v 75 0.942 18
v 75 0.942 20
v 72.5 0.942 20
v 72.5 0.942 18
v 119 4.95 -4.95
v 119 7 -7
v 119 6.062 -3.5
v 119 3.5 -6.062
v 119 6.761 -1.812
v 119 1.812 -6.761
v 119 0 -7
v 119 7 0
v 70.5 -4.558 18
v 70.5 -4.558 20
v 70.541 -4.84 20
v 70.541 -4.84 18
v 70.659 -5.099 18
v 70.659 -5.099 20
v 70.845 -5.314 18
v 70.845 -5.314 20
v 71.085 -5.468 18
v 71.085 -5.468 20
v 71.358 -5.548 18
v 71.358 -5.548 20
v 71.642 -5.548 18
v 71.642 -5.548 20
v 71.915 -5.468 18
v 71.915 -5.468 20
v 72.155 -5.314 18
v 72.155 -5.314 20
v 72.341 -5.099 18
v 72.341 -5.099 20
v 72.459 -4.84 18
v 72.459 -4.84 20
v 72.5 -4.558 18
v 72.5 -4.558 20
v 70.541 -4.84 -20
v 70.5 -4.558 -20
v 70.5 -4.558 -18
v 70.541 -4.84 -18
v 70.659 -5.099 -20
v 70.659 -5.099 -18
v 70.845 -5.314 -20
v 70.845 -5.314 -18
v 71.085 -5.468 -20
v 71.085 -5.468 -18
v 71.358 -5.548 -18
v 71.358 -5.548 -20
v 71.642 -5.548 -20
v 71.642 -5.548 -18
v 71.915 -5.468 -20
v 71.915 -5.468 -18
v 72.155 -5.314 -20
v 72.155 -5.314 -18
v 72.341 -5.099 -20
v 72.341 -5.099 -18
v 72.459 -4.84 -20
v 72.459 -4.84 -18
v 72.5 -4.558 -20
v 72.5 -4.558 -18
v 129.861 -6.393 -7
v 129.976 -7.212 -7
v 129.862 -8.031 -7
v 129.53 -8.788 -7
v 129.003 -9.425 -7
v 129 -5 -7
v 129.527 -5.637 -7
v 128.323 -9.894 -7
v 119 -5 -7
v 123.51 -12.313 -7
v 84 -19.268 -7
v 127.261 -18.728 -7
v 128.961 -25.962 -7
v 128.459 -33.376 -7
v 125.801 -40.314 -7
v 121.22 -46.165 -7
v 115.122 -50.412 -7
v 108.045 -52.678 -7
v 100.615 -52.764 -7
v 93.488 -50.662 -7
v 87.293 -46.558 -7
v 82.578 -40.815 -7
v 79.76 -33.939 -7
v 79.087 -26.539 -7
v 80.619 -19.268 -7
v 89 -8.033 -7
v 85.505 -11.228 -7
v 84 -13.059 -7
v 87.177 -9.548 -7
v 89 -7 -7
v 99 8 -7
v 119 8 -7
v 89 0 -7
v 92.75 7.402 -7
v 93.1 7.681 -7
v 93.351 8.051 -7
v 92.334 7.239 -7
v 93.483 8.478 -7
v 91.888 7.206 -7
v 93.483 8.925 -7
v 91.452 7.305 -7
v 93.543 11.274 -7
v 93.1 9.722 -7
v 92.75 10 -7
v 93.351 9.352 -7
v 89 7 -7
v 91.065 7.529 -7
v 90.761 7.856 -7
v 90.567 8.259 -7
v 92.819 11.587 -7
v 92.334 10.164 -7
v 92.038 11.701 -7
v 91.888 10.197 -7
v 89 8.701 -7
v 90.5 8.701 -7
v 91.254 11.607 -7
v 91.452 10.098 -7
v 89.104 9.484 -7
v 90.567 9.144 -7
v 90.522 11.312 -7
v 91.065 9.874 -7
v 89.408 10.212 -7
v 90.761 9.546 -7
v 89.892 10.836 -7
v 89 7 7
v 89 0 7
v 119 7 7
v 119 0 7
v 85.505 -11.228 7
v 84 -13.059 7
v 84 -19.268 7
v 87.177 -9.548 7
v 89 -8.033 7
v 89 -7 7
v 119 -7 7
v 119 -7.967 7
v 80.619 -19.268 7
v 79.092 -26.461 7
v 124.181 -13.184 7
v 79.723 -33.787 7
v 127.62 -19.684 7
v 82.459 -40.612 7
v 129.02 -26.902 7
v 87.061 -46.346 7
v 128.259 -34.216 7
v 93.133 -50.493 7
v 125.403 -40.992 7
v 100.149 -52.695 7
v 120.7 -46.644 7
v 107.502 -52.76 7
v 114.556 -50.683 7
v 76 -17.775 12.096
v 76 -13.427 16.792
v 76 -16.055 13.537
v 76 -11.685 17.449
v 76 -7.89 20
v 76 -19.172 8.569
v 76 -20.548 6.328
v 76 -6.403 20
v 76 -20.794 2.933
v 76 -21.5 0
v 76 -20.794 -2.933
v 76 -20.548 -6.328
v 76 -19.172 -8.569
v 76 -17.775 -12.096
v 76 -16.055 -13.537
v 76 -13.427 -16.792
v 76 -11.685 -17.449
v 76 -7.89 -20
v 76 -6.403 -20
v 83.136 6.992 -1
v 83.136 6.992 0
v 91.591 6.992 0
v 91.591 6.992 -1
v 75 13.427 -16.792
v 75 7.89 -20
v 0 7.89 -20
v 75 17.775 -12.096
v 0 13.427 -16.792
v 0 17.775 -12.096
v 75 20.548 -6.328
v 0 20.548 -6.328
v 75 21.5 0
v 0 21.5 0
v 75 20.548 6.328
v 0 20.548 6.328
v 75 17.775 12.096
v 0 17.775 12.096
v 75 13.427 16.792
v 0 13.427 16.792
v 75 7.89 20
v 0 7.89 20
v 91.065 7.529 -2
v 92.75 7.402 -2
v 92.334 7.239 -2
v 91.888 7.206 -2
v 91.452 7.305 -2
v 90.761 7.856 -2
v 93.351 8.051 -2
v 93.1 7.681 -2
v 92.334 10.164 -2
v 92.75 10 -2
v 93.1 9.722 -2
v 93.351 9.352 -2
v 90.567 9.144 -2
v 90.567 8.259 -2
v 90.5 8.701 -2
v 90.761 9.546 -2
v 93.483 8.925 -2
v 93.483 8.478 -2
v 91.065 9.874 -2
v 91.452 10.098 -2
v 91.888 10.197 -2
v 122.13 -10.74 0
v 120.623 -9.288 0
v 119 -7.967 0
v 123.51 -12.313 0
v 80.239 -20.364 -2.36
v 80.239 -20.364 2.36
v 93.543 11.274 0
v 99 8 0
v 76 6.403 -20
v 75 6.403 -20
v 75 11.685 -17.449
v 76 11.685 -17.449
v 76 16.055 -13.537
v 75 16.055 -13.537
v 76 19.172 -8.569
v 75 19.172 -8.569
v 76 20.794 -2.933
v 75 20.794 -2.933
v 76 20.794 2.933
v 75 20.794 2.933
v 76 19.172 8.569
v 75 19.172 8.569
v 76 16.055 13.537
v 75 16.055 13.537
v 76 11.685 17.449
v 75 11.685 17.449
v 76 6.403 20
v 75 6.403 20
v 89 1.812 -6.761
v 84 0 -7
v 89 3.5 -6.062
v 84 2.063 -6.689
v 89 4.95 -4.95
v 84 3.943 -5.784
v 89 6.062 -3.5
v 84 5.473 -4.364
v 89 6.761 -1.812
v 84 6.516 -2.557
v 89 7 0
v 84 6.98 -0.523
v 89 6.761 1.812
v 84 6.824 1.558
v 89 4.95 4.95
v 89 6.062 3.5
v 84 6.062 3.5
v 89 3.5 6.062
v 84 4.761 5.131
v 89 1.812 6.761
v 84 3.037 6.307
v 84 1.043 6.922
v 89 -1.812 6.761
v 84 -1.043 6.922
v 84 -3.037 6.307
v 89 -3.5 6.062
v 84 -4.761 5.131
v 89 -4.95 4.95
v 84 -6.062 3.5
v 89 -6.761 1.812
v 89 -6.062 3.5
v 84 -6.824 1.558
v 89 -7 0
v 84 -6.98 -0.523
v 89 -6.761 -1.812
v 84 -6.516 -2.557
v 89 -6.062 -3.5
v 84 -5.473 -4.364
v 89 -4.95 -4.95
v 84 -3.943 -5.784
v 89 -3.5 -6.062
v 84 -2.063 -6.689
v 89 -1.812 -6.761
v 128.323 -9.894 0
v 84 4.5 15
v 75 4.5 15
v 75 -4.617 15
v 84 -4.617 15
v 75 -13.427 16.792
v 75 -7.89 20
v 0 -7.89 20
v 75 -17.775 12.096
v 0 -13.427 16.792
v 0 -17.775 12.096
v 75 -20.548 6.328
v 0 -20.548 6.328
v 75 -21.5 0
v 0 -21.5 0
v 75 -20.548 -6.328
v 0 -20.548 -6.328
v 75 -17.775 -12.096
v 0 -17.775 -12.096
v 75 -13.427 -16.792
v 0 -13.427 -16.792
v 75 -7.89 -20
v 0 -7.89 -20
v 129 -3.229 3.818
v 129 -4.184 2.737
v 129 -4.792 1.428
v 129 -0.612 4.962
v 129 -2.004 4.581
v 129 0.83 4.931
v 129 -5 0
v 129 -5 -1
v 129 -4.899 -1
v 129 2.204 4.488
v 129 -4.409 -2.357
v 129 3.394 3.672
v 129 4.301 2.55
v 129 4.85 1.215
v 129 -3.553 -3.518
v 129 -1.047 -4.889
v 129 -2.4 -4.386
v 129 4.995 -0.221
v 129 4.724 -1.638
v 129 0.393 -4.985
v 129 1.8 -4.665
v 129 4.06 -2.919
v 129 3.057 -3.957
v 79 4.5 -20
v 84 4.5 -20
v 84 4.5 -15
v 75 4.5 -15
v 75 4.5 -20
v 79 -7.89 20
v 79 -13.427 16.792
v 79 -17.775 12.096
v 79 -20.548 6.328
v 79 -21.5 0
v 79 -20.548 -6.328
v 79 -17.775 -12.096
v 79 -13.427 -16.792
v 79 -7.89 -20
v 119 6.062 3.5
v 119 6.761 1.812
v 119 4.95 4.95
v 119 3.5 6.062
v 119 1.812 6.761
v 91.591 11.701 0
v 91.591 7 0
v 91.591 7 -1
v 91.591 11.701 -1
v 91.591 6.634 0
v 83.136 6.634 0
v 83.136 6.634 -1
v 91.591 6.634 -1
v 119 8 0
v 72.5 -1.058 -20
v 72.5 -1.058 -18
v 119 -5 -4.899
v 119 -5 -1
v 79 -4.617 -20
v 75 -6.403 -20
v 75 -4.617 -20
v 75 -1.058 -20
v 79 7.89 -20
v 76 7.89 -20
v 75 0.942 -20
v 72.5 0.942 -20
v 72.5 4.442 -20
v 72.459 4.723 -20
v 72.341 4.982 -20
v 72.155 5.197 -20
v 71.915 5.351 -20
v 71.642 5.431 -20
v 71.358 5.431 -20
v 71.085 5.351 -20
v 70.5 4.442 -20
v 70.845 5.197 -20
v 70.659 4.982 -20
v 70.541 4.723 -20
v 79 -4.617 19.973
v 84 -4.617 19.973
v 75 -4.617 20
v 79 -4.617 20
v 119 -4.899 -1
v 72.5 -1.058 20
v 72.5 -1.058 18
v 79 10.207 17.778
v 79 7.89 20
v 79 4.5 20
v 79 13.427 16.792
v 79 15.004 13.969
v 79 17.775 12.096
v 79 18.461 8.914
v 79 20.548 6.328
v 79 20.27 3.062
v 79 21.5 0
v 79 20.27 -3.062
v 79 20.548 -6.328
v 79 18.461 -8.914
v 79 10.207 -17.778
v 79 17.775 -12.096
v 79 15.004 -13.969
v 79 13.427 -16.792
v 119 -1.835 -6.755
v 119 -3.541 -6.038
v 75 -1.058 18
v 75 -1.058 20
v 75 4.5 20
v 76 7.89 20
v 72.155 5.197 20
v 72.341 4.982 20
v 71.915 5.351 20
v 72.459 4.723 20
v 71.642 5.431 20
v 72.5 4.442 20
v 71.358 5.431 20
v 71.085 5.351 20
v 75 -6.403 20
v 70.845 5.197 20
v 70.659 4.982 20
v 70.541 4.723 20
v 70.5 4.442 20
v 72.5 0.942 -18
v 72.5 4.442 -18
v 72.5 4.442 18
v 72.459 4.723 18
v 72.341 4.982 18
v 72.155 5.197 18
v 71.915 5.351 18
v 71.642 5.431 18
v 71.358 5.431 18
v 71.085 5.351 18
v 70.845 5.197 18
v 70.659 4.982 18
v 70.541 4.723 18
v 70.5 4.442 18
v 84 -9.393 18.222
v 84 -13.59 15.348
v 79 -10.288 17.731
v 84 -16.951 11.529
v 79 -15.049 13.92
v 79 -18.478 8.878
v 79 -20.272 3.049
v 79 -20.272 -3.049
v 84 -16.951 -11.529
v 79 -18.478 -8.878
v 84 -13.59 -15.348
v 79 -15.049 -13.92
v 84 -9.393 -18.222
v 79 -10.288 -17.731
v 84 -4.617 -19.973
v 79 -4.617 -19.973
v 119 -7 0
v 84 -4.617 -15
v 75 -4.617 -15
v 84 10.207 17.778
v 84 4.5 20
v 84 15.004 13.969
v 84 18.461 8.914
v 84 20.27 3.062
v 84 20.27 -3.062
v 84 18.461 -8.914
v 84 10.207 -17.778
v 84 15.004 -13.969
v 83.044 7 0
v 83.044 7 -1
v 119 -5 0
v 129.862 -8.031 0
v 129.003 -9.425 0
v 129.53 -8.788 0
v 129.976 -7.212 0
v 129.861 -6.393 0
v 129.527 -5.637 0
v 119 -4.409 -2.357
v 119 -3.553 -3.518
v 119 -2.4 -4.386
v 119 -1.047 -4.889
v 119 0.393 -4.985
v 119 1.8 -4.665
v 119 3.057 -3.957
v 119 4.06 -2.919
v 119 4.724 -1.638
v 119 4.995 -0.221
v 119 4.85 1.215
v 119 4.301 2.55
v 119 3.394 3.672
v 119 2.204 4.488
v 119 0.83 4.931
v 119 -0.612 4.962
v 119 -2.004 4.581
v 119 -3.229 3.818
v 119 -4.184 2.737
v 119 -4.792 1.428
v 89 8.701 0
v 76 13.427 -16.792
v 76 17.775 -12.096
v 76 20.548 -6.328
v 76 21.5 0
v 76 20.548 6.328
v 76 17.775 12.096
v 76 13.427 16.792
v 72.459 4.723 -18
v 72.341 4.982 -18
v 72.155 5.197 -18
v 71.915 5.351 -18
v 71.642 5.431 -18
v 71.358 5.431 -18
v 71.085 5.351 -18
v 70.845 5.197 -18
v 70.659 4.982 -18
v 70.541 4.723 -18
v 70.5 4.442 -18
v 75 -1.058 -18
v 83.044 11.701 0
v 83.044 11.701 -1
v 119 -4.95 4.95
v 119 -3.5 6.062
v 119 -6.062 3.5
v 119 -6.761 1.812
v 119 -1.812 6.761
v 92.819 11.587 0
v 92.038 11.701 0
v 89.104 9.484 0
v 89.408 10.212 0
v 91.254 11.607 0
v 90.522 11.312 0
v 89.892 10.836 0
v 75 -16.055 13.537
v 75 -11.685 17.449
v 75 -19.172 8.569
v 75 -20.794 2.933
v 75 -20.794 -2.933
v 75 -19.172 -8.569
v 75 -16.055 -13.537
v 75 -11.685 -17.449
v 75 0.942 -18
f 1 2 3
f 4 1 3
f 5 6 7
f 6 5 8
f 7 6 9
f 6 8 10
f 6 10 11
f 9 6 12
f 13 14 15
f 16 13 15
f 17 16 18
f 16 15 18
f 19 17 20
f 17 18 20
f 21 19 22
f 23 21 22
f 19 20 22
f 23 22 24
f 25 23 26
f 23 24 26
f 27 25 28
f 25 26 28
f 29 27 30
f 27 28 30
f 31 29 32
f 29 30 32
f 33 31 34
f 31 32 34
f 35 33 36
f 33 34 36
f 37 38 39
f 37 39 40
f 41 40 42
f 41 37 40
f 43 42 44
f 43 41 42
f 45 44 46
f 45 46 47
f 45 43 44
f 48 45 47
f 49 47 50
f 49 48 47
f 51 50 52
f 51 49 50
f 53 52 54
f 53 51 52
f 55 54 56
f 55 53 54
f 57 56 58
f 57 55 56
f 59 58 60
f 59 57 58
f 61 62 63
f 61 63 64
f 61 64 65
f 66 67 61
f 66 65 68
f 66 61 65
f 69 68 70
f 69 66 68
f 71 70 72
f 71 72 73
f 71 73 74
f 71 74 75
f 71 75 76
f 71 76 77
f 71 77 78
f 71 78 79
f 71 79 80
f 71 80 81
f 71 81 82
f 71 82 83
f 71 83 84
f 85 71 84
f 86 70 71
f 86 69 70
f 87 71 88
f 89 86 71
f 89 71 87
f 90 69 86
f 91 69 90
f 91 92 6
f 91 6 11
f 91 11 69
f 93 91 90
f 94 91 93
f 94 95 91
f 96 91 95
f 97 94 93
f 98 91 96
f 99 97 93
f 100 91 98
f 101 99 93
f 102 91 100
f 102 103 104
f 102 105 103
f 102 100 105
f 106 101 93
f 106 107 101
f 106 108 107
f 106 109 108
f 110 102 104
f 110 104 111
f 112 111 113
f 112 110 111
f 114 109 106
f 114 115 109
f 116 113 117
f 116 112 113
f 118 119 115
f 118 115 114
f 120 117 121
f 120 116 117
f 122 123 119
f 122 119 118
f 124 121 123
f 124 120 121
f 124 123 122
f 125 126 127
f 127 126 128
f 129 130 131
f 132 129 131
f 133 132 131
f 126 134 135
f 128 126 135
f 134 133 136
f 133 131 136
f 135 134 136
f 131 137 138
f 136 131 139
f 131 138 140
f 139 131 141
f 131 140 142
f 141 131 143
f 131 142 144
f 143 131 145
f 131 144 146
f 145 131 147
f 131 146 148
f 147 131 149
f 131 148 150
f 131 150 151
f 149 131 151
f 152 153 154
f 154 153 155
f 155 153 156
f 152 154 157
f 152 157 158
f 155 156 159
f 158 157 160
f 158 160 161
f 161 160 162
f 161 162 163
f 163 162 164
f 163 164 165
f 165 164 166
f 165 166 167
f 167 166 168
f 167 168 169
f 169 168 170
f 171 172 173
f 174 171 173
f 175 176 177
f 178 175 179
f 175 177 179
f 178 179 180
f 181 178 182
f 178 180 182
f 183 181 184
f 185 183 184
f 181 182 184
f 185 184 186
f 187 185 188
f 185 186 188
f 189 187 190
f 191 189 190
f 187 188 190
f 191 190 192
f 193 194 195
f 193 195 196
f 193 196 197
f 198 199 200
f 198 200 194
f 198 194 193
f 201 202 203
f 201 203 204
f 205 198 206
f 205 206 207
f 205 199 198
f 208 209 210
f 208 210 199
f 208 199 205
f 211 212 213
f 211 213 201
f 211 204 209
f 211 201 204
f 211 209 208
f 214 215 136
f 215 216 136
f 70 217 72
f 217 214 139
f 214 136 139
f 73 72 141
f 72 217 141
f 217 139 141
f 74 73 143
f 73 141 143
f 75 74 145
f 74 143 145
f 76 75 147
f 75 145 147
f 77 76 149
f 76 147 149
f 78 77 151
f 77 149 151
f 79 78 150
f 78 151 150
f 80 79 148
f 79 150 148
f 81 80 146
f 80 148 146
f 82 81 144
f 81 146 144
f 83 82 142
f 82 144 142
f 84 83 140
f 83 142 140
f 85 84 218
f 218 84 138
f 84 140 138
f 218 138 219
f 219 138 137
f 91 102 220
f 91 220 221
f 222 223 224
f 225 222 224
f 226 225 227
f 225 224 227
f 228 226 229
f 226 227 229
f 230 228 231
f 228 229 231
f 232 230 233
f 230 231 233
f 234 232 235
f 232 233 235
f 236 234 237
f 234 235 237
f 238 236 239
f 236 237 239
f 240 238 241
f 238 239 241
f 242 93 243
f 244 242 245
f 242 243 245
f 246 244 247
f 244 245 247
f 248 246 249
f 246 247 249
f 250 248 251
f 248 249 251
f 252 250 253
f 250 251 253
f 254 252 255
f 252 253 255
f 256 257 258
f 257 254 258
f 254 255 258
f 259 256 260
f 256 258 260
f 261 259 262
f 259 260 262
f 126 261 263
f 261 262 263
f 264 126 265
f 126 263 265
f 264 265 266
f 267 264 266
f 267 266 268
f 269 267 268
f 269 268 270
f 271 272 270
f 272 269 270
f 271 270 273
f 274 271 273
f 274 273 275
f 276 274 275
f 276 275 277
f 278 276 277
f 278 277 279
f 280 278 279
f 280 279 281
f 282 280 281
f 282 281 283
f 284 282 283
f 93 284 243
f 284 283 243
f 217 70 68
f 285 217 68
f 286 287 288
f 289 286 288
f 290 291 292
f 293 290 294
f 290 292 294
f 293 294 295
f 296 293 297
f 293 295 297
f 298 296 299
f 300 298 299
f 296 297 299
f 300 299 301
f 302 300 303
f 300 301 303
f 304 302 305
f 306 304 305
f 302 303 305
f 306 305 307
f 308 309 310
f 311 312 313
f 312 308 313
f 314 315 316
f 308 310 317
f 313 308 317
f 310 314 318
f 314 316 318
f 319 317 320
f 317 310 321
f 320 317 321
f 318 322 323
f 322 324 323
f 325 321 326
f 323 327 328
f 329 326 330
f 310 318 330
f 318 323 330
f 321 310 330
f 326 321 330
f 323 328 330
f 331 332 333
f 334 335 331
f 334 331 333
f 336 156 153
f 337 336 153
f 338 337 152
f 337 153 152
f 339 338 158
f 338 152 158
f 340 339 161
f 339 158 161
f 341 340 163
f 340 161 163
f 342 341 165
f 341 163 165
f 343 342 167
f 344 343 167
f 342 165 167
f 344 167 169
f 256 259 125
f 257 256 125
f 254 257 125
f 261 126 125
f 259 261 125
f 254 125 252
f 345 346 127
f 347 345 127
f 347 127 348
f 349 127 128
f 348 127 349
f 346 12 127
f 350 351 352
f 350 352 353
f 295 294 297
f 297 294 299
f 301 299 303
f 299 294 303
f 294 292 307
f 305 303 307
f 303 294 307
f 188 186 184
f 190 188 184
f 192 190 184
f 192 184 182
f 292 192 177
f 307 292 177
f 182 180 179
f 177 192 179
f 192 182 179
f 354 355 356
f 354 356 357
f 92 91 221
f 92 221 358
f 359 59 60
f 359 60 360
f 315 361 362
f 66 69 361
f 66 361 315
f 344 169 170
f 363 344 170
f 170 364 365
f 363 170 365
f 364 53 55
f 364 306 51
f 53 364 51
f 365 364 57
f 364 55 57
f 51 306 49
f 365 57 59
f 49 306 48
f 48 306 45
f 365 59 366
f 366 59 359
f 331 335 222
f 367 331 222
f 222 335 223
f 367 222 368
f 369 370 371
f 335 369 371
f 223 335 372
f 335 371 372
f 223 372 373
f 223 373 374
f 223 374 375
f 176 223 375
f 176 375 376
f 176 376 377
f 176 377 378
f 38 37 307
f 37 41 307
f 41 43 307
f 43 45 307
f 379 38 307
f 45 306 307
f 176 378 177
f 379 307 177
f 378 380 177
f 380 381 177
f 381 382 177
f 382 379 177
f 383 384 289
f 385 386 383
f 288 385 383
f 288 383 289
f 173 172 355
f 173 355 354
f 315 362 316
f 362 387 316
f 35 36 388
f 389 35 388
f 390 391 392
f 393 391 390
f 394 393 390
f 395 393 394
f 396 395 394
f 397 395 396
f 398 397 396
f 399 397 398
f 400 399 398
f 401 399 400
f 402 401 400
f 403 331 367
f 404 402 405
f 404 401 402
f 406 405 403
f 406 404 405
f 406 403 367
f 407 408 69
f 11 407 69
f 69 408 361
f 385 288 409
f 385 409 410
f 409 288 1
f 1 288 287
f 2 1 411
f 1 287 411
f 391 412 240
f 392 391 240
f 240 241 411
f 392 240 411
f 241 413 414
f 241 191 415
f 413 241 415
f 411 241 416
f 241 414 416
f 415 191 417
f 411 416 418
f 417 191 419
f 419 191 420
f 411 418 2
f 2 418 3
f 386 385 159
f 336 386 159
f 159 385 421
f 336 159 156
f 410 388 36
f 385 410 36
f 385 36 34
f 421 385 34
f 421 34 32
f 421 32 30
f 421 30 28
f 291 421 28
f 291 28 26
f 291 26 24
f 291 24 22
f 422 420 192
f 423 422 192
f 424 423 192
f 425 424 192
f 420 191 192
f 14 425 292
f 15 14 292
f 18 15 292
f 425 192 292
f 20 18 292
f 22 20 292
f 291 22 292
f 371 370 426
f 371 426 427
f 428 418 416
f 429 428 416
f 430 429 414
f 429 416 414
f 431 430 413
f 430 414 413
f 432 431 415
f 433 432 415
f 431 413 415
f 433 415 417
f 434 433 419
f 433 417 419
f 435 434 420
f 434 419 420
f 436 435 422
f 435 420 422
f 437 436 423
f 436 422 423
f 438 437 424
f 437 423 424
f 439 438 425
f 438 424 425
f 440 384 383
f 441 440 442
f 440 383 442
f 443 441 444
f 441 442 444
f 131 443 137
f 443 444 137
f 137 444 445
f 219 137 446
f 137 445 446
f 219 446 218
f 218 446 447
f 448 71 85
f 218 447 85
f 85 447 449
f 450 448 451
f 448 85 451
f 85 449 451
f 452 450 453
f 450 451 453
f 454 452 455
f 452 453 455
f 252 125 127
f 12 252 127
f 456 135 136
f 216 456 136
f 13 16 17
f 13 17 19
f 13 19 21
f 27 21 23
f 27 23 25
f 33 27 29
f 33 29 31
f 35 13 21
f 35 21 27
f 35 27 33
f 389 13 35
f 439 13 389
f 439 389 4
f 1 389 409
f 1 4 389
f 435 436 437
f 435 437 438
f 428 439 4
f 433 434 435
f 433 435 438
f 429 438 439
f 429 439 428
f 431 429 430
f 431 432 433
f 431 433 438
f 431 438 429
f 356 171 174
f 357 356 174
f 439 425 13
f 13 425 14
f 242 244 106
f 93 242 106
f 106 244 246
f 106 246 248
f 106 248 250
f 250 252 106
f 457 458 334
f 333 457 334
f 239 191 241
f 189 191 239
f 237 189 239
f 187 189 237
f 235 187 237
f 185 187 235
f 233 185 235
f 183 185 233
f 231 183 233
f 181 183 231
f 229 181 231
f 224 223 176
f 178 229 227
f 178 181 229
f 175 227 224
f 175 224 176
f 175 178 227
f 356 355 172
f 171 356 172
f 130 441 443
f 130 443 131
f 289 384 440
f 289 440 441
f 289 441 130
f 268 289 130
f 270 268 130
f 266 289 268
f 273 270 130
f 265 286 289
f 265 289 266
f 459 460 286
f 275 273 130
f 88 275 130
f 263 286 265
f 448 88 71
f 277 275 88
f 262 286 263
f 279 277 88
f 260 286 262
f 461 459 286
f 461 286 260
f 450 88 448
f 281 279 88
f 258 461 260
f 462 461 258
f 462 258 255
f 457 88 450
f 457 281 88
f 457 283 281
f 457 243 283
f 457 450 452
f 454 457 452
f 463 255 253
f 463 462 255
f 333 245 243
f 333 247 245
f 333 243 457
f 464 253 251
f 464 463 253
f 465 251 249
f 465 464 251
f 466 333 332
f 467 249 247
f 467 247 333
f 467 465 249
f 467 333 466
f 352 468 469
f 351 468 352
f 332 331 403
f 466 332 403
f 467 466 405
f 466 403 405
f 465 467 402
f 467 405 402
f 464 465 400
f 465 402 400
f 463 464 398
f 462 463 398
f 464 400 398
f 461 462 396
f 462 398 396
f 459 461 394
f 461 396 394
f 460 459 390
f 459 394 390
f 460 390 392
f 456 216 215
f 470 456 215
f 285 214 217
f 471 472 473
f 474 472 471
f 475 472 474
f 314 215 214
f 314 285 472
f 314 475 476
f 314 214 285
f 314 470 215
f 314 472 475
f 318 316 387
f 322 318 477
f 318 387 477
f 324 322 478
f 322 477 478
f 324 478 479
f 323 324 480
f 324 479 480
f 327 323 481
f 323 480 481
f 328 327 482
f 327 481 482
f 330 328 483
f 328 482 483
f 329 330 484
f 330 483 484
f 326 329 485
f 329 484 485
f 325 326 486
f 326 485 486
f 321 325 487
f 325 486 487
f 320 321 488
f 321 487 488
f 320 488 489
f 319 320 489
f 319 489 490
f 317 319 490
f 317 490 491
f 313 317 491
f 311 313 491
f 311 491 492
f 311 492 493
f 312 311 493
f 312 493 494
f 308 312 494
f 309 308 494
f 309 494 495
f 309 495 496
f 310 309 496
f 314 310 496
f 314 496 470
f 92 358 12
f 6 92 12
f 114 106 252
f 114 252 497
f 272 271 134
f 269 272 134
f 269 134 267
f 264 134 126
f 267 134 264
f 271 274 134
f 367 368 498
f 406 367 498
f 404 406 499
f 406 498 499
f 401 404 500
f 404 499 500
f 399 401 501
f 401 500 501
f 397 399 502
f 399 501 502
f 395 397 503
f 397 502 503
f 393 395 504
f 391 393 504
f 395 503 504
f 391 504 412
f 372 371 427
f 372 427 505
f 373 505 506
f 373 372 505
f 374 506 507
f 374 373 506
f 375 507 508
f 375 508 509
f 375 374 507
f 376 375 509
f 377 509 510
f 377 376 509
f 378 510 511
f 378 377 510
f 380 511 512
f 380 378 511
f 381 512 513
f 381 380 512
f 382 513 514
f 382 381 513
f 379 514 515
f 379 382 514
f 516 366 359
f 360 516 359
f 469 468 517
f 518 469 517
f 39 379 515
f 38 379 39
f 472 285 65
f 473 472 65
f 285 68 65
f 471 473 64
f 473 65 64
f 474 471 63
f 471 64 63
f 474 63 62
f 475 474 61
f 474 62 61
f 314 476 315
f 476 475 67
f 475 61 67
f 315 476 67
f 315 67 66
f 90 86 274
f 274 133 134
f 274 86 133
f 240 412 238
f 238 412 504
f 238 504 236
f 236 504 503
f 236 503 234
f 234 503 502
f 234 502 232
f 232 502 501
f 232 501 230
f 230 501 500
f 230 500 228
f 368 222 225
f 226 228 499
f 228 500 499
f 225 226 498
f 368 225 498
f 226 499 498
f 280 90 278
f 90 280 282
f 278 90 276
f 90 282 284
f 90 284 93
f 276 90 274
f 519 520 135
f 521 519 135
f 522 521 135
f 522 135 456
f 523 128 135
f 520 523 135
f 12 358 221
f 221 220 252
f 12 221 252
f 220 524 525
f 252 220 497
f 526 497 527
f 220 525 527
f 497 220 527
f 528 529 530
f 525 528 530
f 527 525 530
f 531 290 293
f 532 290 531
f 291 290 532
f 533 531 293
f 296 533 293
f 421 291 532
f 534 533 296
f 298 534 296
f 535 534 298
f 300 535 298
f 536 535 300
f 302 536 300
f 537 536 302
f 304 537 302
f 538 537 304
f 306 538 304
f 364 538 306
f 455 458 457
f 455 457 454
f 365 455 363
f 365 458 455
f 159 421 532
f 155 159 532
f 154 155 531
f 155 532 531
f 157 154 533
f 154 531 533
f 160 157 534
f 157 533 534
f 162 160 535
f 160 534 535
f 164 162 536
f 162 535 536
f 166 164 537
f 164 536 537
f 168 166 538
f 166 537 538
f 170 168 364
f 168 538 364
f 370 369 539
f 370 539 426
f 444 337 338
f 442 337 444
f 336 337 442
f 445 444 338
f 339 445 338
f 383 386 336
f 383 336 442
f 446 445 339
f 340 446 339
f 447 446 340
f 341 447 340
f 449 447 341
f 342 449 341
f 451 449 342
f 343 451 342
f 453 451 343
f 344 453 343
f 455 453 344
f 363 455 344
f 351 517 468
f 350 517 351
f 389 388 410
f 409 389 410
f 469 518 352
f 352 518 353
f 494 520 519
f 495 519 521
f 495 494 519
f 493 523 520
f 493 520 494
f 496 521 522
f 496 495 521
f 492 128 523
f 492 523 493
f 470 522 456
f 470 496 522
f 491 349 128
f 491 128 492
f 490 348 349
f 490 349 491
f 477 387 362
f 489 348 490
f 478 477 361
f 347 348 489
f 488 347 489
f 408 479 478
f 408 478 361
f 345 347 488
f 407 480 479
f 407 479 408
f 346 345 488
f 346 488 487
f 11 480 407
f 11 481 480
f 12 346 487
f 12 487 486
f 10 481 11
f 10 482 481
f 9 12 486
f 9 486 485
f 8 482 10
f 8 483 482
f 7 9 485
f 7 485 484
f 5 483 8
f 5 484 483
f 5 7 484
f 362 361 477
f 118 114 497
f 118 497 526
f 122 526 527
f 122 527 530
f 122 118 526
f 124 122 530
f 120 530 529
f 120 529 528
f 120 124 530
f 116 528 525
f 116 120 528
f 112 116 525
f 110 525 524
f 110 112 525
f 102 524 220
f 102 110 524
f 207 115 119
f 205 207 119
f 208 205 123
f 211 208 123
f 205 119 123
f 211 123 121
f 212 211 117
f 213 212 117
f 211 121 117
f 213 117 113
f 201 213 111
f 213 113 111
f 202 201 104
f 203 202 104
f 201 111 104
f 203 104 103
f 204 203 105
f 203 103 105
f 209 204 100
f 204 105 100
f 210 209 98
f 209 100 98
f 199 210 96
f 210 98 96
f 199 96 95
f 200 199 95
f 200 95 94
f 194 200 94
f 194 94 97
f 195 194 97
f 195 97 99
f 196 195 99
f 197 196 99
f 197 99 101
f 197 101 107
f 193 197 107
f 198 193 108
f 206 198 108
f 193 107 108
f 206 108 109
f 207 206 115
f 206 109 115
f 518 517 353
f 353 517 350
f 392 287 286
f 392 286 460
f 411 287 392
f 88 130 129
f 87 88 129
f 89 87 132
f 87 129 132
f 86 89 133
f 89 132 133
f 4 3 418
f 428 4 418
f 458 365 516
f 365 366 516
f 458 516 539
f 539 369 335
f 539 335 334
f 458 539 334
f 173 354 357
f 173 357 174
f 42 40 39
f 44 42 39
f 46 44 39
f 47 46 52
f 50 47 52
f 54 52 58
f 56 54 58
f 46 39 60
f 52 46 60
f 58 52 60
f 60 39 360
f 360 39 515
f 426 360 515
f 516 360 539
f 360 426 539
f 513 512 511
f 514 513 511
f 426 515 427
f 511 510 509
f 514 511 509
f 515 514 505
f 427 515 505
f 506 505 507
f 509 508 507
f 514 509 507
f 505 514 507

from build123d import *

# Parameters (mm, degrees)
BOSS_EXTRU_1_DEPTH      = 75
BOSS_EXTRU_2_DEPTH      = 1
BOSS_EXTRU_3_DEPTH      = 3
BOSS_EXTRU_4_DEPTH      = 5
ENL_V_START             = -9
ENL_V_MAT_EXTRU_4_DEPTH = 9
ESQUISSE6_W             = 1.343848997
ESQUISSE6_H             = 2
ENL_V_MAT_EXTRU_5_DEPTH = 2
ESQUISSE7_W             = 4.610249179
ESQUISSE7_H             = 2
ENL_V_MAT_EXTRU_7_DEPTH = 2
ESQUISSE8_R             = 7
BOSS_EXTRU_5_DEPTH      = 35
ESQUISSE9_R             = 5
BOSS_EXTRU_6_DEPTH      = 10
BOSS_EXTRU_7_DEPTH      = 14
BOSS_EXTRU_8_DEPTH      = 7
ESQUISSE11_W            = 8.454779373
ESQUISSE11_H            = 0.357592341
BOSS_EXTRU_14_DEPTH     = 1
ESQUISSE11_W_2          = 8.547038988
ESQUISSE11_H_2          = 4.701428863
BOSS_EXTRU_14_2_DEPTH   = 1
ESQUISSE13_R            = 1.5
ENL_V_MAT_EXTRU_9_DEPTH = 5
BOSS_EXTRU_19_DEPTH     = 6
BOSS_EXTRU_21_DEPTH     = 1


with BuildPart() as part:
    # Esquisse1 → Boss.-Extru.1 (new body)
    with BuildSketch(Plane(origin=(0, 0, 0), x_dir=(0, 0, -1), z_dir=(1, 0, 0))):
        with BuildLine():
            Line((-20, 7.889866919), (-20, -7.889866919))
            ThreePointArc((-20, -7.889866919), (0, -21.5), (20, -7.889866919))
            Line((20, -7.889866919), (20, 7.889866919))
            ThreePointArc((20, 7.889866919), (0, 21.5), (-20, 7.889866919))
        make_face()
    extrude(amount=BOSS_EXTRU_1_DEPTH)

    # Esquisse2 → Boss.-Extru.2 (add)
    with BuildSketch(Plane(origin=(75, 0, 0), x_dir=(0, 0, -1), z_dir=(1, 0, 0))):
        with BuildLine():
            Line((-20, 6.403124237), (-20, -6.403124237))
            ThreePointArc((-20, -6.403124237), (0, -21), (20, -6.403124237))
            Line((20, -6.403124237), (20, 6.403124237))
            ThreePointArc((20, 6.403124237), (0, 21), (-20, 6.403124237))
        make_face()
    extrude(amount=BOSS_EXTRU_2_DEPTH)

    # Esquisse3 → Boss.-Extru.3 (add)
    with BuildSketch(Plane(origin=(76, 0, 0), x_dir=(0, 0, -1), z_dir=(1, 0, 0))):
        with BuildLine():
            Line((-20, 7.889866919), (-20, -7.889866919))
            ThreePointArc((-20, -7.889866919), (0, -21.5), (20, -7.889866919))
            Line((20, -7.889866919), (20, 7.889866919))
            ThreePointArc((20, 7.889866919), (0, 21.5), (-20, 7.889866919))
        make_face()
    extrude(amount=BOSS_EXTRU_3_DEPTH)

    # Esquisse4 → Boss.-Extru.4 (add)
    with BuildSketch(Plane(origin=(79, 0, 0), x_dir=(0, 0, -1), z_dir=(1, 0, 0))):
        with BuildLine():
            Line((-20.052462527, 4.260134574), (-20, -4.5))
            ThreePointArc((-20, -4.5), (0.122767809, -20.499632389), (20.052462527, -4.260134574))
            Line((20.052462527, -4.260134574), (20.052462527, 4.260134574))
            ThreePointArc((20.052462527, 4.260134574), (0, 20.5), (-20.052462527, 4.260134574))
        make_face()
    extrude(amount=BOSS_EXTRU_4_DEPTH)

    # Esquisse5 → Enlèv. mat.-Extru.4 (cut)
    with BuildSketch(Plane(origin=(84, 0, 0), x_dir=(0, 0, -1), z_dir=(1, 0, 0)).offset(ENL_V_START)):
        Polygon((-20, 4.5), (-15, 4.5), (-15, -4.616819805), (-20, -4.616819805), (-23.835096054, -4.616819805), (-23.835096054, 4.5), align=None)
        Polygon((20, -4.616819805), (15, -4.616819805), (15, 4.5), (20, 4.5), (24.013796719, 4.5), (24.013796719, -4.616819805), align=None)
    extrude(amount=ENL_V_MAT_EXTRU_4_DEPTH, mode=Mode.SUBTRACT)

    # Esquisse6 → Enlèv. mat.-Extru.5 (cut)
    with BuildSketch(Plane.XY.offset(20)):
        with BuildLine():
            Line((72.5, -4.558409903), (72.5, 4.441590097))
            ThreePointArc((72.5, 4.441590097), (71.5, 5.441590097), (70.5, 4.441590097))
            Line((70.5, 4.441590097), (70.5, -4.558409903))
            ThreePointArc((70.5, -4.558409903), (71.5, -5.558409903), (72.5, -4.558409903))
        make_face()
        Polygon((72.5, -0.058409903), (72.5, -1.058409903), (75, -1.058409903), (75, 0.941590097), (72.5, 0.941590097), align=None)
        with Locations((75.671924499, -0.058409903)):
            Rectangle(ESQUISSE6_W, ESQUISSE6_H)
    extrude(amount=-ENL_V_MAT_EXTRU_5_DEPTH, mode=Mode.SUBTRACT)

    # Esquisse7 → Enlèv. mat.-Extru.7 (cut)
    with BuildSketch(Plane(origin=(0, 0, -20), x_dir=(-1, 0, 0), z_dir=(0, 0, -1))):
        with BuildLine():
            Line((-70.5, 4.441590097), (-70.5, -4.558409903))
            ThreePointArc((-70.5, -4.558409903), (-71.5, -5.558409903), (-72.5, -4.558409903))
            Line((-72.5, -4.558409903), (-72.5, 4.441590097))
            ThreePointArc((-72.5, 4.441590097), (-71.5, 5.441590097), (-70.5, 4.441590097))
        make_face()
        with Locations((-74.038724408, -0.058409903)):
            Rectangle(ESQUISSE7_W, ESQUISSE7_H)
    extrude(amount=-ENL_V_MAT_EXTRU_7_DEPTH, mode=Mode.SUBTRACT)

    # Esquisse8 → Boss.-Extru.5 (add)
    with BuildSketch(Plane(origin=(84, 0, 0), x_dir=(0, 0, -1), z_dir=(1, 0, 0))):
        Circle(ESQUISSE8_R)
    extrude(amount=BOSS_EXTRU_5_DEPTH)

    # Esquisse9 → Boss.-Extru.6 (add)
    with BuildSketch(Plane(origin=(119, 0, 0), x_dir=(0, 0, -1), z_dir=(1, 0, 0))):
        Circle(ESQUISSE9_R)
    extrude(amount=BOSS_EXTRU_6_DEPTH)

    # Esquisse3D1 → Boss.-Extru.7 (add)
    with BuildSketch(Plane(origin=(119, -7, 7), x_dir=(-0.9061831399952655, 0.42288546533112387, 0), z_dir=(0, 0, 1))):
        with BuildLine():
            Line((0, 0), (-0.40889541, 0.876204451))
            ThreePointArc((-0.40889541, 0.876204451), (-5.950101839, 47.985584164), (26.748554102, 13.622864171))
            Line((26.748554102, 13.622864171), (27.1854942, 12.68656396))
            Line((27.1854942, 12.68656396), (30.145692457, 6.34328198))
            Line((30.145692457, 6.34328198), (33.105890714, 0))
            Line((33.105890714, 0), (5.920396515, -12.68656396))
            Line((5.920396515, -12.68656396), (2.960198257, -6.34328198))
            Line((2.960198257, -6.34328198), (0, 0))
        make_face()
    extrude(amount=-BOSS_EXTRU_7_DEPTH)

    # Esquisse10 → Boss.-Extru.8 (add)
    with BuildSketch(Plane(origin=(0, 0, -7), x_dir=(-1, 0, 0), z_dir=(0, 0, -1))):
        with BuildLine():
            Line((-93.543487266, 11.27390764), (-99, 8))
            Line((-99, 8), (-119, 8))
            Line((-119, 8), (-119, 7))
            Line((-119, 7), (-89, 7))
            Line((-89, 7), (-89, 8.701428863))
            ThreePointArc((-89, 8.701428863), (-90.521903555, 11.312028583), (-93.543487266, 11.27390764))
        make_face()
    extrude(amount=-BOSS_EXTRU_8_DEPTH)

    # Esquisse13 → Enlèv. mat.-Extru.9 (cut)
    with BuildSketch(Plane(origin=(0, 0, -7), x_dir=(-1, 0, 0), z_dir=(0, 0, -1))):
        with Locations((-92, 8.701428863)):
            Circle(ESQUISSE13_R)
    extrude(amount=-ENL_V_MAT_EXTRU_9_DEPTH, mode=Mode.SUBTRACT)

    # Esquisse14 → Boss.-Extru.19 (add)
    with BuildSketch(Plane(origin=(0, 0, -7), x_dir=(-1, 0, 0), z_dir=(0, 0, -1))):
        with BuildLine():
            Line((-119, -7.966917626), (-119, -5))
            Line((-119, -5), (-129, -5))
            ThreePointArc((-129, -5), (-129.947341767, -7.625116181), (-128.322942162, -9.894481139))
            Line((-128.322942162, -9.894481139), (-123.510402797, -12.313464527))
            ThreePointArc((-123.510402797, -12.313464527), (-121.391871018, -9.998369292), (-119, -7.966917626))
        make_face()
        with BuildLine():
            Line((-116.735831391, -15.718647205), (-119, -5))
            Line((-119, -5), (-119, -7.966917626))
            ThreePointArc((-119, -7.966917626), (-121.391871018, -9.998369292), (-123.510402797, -12.313464527))
            Line((-123.510402797, -12.313464527), (-116.735831391, -15.718647205))
        make_face()
    extrude(amount=-BOSS_EXTRU_19_DEPTH)

    # Esquisse15 → Boss.-Extru.21 (add)
    with BuildSketch(Plane.XY.offset(-1)):
        with BuildLine():
            Line((129, -5), (119, -5))
            Line((119, -5), (119, -7.966917626))
            ThreePointArc((119, -7.966917626), (121.391871018, -9.998369292), (123.510402797, -12.313464527))
            Line((123.510402797, -12.313464527), (128.322942162, -9.894481139))
            ThreePointArc((128.322942162, -9.894481139), (129.947341767, -7.625116181), (129, -5))
        make_face()
        with BuildLine():
            Line((119, -7.966917626), (119, -5))
            Line((119, -5), (129, -5))
            Line((129, -5), (129, -4.21403801))
            Line((129, -4.21403801), (116.988858201, -4.21403801))
            Line((116.988858201, -4.21403801), (116.735831391, -15.718647205))
            Line((116.735831391, -15.718647205), (123.510402797, -12.313464527))
            ThreePointArc((123.510402797, -12.313464527), (121.391871018, -9.998369292), (119, -7.966917626))
        make_face()
    extrude(amount=BOSS_EXTRU_21_DEPTH)


with BuildPart() as body_2:
    # Esquisse11 → Boss.-Extru.14 (new body)
    with BuildSketch(Plane.XY):
        with Locations((87.363409124, 6.813235512)):
            Rectangle(ESQUISSE11_W, ESQUISSE11_H)
    extrude(amount=-BOSS_EXTRU_14_DEPTH)


with BuildPart() as body_3:
    # Esquisse11 → Boss.-Extru.14 2 (new body)
    with BuildSketch(Plane.XY):
        with Locations((87.317279316, 9.350714432)):
            Rectangle(ESQUISSE11_W_2, ESQUISSE11_H_2)
    extrude(amount=-BOSS_EXTRU_14_2_DEPTH)


solid = Compound([part.part, body_2.part, body_3.part])
